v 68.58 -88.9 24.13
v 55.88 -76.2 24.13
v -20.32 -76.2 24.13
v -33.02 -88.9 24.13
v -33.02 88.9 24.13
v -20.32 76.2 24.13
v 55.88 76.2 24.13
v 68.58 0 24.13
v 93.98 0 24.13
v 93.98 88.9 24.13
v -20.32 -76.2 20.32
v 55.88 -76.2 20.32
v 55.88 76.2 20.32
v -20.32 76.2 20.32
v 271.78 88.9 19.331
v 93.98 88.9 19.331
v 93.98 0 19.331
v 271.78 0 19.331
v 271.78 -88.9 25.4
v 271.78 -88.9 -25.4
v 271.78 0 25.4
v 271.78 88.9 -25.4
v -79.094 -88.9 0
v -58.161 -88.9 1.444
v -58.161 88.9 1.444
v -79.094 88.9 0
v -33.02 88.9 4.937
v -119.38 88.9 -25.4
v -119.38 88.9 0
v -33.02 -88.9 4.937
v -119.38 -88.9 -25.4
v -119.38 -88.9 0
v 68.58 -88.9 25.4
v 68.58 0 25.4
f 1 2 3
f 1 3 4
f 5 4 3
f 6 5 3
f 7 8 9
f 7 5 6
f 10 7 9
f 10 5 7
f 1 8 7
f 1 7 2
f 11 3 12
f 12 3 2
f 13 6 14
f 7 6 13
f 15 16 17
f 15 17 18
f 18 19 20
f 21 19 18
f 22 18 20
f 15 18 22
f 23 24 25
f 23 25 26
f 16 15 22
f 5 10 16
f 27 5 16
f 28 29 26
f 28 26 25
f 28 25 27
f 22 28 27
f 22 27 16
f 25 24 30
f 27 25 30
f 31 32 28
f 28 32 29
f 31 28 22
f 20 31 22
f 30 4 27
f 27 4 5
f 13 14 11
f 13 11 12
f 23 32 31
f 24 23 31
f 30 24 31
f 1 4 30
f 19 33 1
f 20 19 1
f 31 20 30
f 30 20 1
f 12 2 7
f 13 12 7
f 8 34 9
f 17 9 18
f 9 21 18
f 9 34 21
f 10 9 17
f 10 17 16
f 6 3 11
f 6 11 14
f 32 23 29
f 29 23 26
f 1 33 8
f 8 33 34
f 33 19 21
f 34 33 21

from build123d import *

# Parameters (mm, degrees)
F0_W          = 137.16
F0_H          = 177.8
F1_DEPTH      = 25.4
F3_DEPTH      = 177.801
F4_DEPTH      = 25.4
F5_DEPTH      = 203.2
F7_DEPTH      = 177.801
F8_W          = 88.9
F8_H          = 6.0689005345
F9_DEPTH      = 203.2010001
F10_T4_DEPTH  = 183.39269854
F10_T11_DEPTH = 88.9
F10_T16_DEPTH = 88.9
F11_DEPTH     = 50.8
F12_R         = 152.4
F13_W         = 101.6
F13_H         = 177.8
F14_DEPTH     = 50.8
F15_W         = 76.2
F15_H         = 152.4
F16_DEPTH     = 5.08
F17_DEPTH     = 25.4
F19_DEPTH     = 1.27
F20_DEPTH     = 25.4


# Not quite as in the source:
# - a fillet or chamfer that OpenCascade refuses, or shapes differently, is made with other operations: its cross-section is extruded or revolved along the edge and cut away or added


with BuildPart() as f1:
    # F0 (on Top) → F1 (new body)
    with BuildSketch(Plane.XY):
        Rectangle(F0_W, F0_H)
    extrude(amount=F1_DEPTH)

    # F2 (on face) → F3 (cut, through all)
    with BuildSketch(Plane.XZ.offset(88.9)):
        Polygon((-97.1020311117, 25.4), (-68.58, 0), (68.58, 25.4), (26.2377727777, 59.2203438282), align=None)
    extrude(amount=-F3_DEPTH, mode=Mode.SUBTRACT)

    # F4 (add): a face of the model
    f4_faces = [f1.faces().sort_by_distance(p)[0] for p in [
        (0, 0, 0),
    ]]
    extrude(f4_faces, amount=F4_DEPTH)

    # F5 (add): a face of the model
    f5_faces = [f1.faces().sort_by_distance(p)[0] for p in [
        (68.58, 0, 0),
    ]]
    extrude(f5_faces, amount=F5_DEPTH)

    # F6 (on face) → F7 (cut, through all)
    with BuildSketch(Plane(origin=(0, 88.9, 0), x_dir=(-1, 0, 0), z_dir=(0, 1, 0))):
        with BuildLine():
            add(Edge.make_bspline(
                [(68.58, 0), (45.7187770864, 3.1689187819), (-0.0085622279, 9.5074346586), (-45.7212234372, 16.0563109217), (-68.58, 19.3310994655)],
                knots=[0, 0, 0, 0, 0.4999464928, 1, 1, 1, 1], degree=3))
            Line((68.58, 0), (68.58, 17.6316630095))
            Line((68.58, 17.6316630095), (-68.58, 25.4))
            add(Edge.make_bspline(
                [(-68.58, 19.3310994655), (-68.58, 21.3540663103), (-68.58, 23.3770331552), (-68.58, 25.4)],
                knots=[0, 0, 0, 0, 6.0689005345, 6.0689005345, 6.0689005345, 6.0689005345], degree=3))
        make_face()
    extrude(amount=-F7_DEPTH, mode=Mode.SUBTRACT)

    # F8 (on face) → F9 (cut, through all)
    with BuildSketch(Plane(origin=(68.58, 0, 0), x_dir=(0, -1, 0), z_dir=(-1, 0, 0))):
        with Locations((-44.45, 22.3655497327)):
            Rectangle(F8_W, F8_H)
    extrude(amount=-F9_DEPTH, mode=Mode.SUBTRACT)

    # F10: fillet of radius 127 on 2 edges, made by hand


with BuildPart() as f10_tool2:
    # F10_s3 → F10_t4 (new body)
    with BuildSketch(Plane.XZ.offset(-94.49269854)):
        with BuildLine():
            ThreePointArc((31.1637123625, 13.9794051724), (50.3142381771, 18.2403654673), (68.58, 25.4))
            Line((68.58, 25.4), (69.6868281979, 23.1138391701))
            ThreePointArc((69.6868281979, 23.1138391701), (71.12, 22.3655497327), (71.12, 19.3310994655))
            Line((71.12, 19.3310994655), (68.9402072085, 16.8167703767))
            ThreePointArc((68.9402072085, 16.8167703767), (50.2320909574, 14.1376913402), (31.5222148076, 11.4648324459))
            Line((31.5222148076, 11.4648324459), (31.1637123625, 13.9794051724))
        make_face()
    extrude(amount=F10_T4_DEPTH)

    split(bisect_by=Plane.XZ.offset(-88.9), keep=Keep.TOP)

    split(bisect_by=Plane.XY.offset(19.3310994655), keep=Keep.BOTTOM)

    split(bisect_by=Plane.XZ, keep=Keep.BOTTOM)


with BuildPart() as f1_1:
    add(f1.part)

    # F10_t1: union F10_tool2
    add(f10_tool2.part)


with BuildPart() as f10_tool9:
    # F10_s10 → F10_t11 (new body)
    with BuildSketch(Plane.XZ):
        with BuildLine():
            ThreePointArc((31.1637123625, 13.9794051724), (50.3142381771, 18.2403654673), (68.58, 25.4))
            Line((68.58, 25.4), (69.6868281979, 23.1138391701))
            ThreePointArc((69.6868281979, 23.1138391701), (71.12, 22.3655497327), (71.12, 19.3310994655))
            Line((71.12, 19.3310994655), (68.9402072085, 16.8167703767))
            ThreePointArc((68.9402072085, 16.8167703767), (50.2320909574, 14.1376913402), (31.5222148076, 11.4648324459))
            Line((31.5222148076, 11.4648324459), (31.1637123625, 13.9794051724))
        make_face()
    extrude(amount=F10_T11_DEPTH)

    split(bisect_by=Plane.XY.offset(19.3310994655), keep=Keep.BOTTOM)


with BuildPart() as f1_2:
    add(f1_1.part)

    # F10_t8: union F10_tool9
    add(f10_tool9.part)


with BuildPart() as f10_tool14:
    # F10_s15 → F10_t16 (new body)
    with BuildSketch(Plane.XZ):
        with BuildLine():
            ThreePointArc((31.1637123625, 13.9794051724), (50.3142381771, 18.2403654673), (68.58, 25.4))
            Line((68.58, 25.4), (69.6868281979, 23.1138391701))
            ThreePointArc((69.6868281979, 23.1138391701), (71.12, 22.3655497327), (71.12, 19.3310994655))
            Line((71.12, 19.3310994655), (68.9402072085, 16.8167703767))
            ThreePointArc((68.9402072085, 16.8167703767), (50.2320909574, 14.1376913402), (31.5222148076, 11.4648324459))
            Line((31.5222148076, 11.4648324459), (31.1637123625, 13.9794051724))
        make_face()
    extrude(amount=F10_T16_DEPTH)

    split(bisect_by=Plane.XY.offset(19.3310994655), keep=Keep.TOP)


with BuildPart() as f1_3:
    add(f1_2.part)

    # F10_t13: union F10_tool14
    add(f10_tool14.part)

    # F11 (add): a face of the model
    f11_faces = [f1_3.faces().sort_by_distance(p)[0] for p in [
        (-68.58, 0, -12.7),
    ]]
    extrude(f11_faces, amount=F11_DEPTH)

    # F12
    f12_edges = [f1_3.edges().sort_by_distance(p)[0] for p in [
        (-68.58, 0, 0),
    ]]
    fillet(f12_edges, radius=F12_R)

    # F13 (on face) → F14 (join)
    with BuildSketch(Plane.XY.offset(25.4)):
        with Locations((17.78, 0)):
            Rectangle(F13_W, F13_H)
    extrude(amount=-F14_DEPTH)

    # F15 (on face) → F16 (cut)
    with BuildSketch(Plane.XY.offset(25.4)):
        with Locations((17.78, 0)):
            Rectangle(F15_W, F15_H)
    extrude(amount=-F16_DEPTH, mode=Mode.SUBTRACT)

    # F17 (add): a face of the model
    f17_faces = [f1_3.faces().sort_by_distance(p)[0] for p in [
        (68.58, 44.45, 22.3655497327),
    ]]
    extrude(f17_faces, amount=F17_DEPTH)

    # F18 (on face) → F19 (cut)
    with BuildSketch(Plane.XY.offset(25.4)):
        Polygon((93.98, -88.9), (93.98, 0), (93.98, 88.9), (-33.02, 88.9), (-33.02, -88.9), align=None)
    extrude(amount=-F19_DEPTH, mode=Mode.SUBTRACT)

    # F20 (add): a face of the model
    f20_faces = [f1_3.faces().sort_by_distance(p)[0] for p in [
        (93.98, -44.45, 24.765),
    ]]
    extrude(f20_faces, amount=F20_DEPTH)


solid = f1_3.part
